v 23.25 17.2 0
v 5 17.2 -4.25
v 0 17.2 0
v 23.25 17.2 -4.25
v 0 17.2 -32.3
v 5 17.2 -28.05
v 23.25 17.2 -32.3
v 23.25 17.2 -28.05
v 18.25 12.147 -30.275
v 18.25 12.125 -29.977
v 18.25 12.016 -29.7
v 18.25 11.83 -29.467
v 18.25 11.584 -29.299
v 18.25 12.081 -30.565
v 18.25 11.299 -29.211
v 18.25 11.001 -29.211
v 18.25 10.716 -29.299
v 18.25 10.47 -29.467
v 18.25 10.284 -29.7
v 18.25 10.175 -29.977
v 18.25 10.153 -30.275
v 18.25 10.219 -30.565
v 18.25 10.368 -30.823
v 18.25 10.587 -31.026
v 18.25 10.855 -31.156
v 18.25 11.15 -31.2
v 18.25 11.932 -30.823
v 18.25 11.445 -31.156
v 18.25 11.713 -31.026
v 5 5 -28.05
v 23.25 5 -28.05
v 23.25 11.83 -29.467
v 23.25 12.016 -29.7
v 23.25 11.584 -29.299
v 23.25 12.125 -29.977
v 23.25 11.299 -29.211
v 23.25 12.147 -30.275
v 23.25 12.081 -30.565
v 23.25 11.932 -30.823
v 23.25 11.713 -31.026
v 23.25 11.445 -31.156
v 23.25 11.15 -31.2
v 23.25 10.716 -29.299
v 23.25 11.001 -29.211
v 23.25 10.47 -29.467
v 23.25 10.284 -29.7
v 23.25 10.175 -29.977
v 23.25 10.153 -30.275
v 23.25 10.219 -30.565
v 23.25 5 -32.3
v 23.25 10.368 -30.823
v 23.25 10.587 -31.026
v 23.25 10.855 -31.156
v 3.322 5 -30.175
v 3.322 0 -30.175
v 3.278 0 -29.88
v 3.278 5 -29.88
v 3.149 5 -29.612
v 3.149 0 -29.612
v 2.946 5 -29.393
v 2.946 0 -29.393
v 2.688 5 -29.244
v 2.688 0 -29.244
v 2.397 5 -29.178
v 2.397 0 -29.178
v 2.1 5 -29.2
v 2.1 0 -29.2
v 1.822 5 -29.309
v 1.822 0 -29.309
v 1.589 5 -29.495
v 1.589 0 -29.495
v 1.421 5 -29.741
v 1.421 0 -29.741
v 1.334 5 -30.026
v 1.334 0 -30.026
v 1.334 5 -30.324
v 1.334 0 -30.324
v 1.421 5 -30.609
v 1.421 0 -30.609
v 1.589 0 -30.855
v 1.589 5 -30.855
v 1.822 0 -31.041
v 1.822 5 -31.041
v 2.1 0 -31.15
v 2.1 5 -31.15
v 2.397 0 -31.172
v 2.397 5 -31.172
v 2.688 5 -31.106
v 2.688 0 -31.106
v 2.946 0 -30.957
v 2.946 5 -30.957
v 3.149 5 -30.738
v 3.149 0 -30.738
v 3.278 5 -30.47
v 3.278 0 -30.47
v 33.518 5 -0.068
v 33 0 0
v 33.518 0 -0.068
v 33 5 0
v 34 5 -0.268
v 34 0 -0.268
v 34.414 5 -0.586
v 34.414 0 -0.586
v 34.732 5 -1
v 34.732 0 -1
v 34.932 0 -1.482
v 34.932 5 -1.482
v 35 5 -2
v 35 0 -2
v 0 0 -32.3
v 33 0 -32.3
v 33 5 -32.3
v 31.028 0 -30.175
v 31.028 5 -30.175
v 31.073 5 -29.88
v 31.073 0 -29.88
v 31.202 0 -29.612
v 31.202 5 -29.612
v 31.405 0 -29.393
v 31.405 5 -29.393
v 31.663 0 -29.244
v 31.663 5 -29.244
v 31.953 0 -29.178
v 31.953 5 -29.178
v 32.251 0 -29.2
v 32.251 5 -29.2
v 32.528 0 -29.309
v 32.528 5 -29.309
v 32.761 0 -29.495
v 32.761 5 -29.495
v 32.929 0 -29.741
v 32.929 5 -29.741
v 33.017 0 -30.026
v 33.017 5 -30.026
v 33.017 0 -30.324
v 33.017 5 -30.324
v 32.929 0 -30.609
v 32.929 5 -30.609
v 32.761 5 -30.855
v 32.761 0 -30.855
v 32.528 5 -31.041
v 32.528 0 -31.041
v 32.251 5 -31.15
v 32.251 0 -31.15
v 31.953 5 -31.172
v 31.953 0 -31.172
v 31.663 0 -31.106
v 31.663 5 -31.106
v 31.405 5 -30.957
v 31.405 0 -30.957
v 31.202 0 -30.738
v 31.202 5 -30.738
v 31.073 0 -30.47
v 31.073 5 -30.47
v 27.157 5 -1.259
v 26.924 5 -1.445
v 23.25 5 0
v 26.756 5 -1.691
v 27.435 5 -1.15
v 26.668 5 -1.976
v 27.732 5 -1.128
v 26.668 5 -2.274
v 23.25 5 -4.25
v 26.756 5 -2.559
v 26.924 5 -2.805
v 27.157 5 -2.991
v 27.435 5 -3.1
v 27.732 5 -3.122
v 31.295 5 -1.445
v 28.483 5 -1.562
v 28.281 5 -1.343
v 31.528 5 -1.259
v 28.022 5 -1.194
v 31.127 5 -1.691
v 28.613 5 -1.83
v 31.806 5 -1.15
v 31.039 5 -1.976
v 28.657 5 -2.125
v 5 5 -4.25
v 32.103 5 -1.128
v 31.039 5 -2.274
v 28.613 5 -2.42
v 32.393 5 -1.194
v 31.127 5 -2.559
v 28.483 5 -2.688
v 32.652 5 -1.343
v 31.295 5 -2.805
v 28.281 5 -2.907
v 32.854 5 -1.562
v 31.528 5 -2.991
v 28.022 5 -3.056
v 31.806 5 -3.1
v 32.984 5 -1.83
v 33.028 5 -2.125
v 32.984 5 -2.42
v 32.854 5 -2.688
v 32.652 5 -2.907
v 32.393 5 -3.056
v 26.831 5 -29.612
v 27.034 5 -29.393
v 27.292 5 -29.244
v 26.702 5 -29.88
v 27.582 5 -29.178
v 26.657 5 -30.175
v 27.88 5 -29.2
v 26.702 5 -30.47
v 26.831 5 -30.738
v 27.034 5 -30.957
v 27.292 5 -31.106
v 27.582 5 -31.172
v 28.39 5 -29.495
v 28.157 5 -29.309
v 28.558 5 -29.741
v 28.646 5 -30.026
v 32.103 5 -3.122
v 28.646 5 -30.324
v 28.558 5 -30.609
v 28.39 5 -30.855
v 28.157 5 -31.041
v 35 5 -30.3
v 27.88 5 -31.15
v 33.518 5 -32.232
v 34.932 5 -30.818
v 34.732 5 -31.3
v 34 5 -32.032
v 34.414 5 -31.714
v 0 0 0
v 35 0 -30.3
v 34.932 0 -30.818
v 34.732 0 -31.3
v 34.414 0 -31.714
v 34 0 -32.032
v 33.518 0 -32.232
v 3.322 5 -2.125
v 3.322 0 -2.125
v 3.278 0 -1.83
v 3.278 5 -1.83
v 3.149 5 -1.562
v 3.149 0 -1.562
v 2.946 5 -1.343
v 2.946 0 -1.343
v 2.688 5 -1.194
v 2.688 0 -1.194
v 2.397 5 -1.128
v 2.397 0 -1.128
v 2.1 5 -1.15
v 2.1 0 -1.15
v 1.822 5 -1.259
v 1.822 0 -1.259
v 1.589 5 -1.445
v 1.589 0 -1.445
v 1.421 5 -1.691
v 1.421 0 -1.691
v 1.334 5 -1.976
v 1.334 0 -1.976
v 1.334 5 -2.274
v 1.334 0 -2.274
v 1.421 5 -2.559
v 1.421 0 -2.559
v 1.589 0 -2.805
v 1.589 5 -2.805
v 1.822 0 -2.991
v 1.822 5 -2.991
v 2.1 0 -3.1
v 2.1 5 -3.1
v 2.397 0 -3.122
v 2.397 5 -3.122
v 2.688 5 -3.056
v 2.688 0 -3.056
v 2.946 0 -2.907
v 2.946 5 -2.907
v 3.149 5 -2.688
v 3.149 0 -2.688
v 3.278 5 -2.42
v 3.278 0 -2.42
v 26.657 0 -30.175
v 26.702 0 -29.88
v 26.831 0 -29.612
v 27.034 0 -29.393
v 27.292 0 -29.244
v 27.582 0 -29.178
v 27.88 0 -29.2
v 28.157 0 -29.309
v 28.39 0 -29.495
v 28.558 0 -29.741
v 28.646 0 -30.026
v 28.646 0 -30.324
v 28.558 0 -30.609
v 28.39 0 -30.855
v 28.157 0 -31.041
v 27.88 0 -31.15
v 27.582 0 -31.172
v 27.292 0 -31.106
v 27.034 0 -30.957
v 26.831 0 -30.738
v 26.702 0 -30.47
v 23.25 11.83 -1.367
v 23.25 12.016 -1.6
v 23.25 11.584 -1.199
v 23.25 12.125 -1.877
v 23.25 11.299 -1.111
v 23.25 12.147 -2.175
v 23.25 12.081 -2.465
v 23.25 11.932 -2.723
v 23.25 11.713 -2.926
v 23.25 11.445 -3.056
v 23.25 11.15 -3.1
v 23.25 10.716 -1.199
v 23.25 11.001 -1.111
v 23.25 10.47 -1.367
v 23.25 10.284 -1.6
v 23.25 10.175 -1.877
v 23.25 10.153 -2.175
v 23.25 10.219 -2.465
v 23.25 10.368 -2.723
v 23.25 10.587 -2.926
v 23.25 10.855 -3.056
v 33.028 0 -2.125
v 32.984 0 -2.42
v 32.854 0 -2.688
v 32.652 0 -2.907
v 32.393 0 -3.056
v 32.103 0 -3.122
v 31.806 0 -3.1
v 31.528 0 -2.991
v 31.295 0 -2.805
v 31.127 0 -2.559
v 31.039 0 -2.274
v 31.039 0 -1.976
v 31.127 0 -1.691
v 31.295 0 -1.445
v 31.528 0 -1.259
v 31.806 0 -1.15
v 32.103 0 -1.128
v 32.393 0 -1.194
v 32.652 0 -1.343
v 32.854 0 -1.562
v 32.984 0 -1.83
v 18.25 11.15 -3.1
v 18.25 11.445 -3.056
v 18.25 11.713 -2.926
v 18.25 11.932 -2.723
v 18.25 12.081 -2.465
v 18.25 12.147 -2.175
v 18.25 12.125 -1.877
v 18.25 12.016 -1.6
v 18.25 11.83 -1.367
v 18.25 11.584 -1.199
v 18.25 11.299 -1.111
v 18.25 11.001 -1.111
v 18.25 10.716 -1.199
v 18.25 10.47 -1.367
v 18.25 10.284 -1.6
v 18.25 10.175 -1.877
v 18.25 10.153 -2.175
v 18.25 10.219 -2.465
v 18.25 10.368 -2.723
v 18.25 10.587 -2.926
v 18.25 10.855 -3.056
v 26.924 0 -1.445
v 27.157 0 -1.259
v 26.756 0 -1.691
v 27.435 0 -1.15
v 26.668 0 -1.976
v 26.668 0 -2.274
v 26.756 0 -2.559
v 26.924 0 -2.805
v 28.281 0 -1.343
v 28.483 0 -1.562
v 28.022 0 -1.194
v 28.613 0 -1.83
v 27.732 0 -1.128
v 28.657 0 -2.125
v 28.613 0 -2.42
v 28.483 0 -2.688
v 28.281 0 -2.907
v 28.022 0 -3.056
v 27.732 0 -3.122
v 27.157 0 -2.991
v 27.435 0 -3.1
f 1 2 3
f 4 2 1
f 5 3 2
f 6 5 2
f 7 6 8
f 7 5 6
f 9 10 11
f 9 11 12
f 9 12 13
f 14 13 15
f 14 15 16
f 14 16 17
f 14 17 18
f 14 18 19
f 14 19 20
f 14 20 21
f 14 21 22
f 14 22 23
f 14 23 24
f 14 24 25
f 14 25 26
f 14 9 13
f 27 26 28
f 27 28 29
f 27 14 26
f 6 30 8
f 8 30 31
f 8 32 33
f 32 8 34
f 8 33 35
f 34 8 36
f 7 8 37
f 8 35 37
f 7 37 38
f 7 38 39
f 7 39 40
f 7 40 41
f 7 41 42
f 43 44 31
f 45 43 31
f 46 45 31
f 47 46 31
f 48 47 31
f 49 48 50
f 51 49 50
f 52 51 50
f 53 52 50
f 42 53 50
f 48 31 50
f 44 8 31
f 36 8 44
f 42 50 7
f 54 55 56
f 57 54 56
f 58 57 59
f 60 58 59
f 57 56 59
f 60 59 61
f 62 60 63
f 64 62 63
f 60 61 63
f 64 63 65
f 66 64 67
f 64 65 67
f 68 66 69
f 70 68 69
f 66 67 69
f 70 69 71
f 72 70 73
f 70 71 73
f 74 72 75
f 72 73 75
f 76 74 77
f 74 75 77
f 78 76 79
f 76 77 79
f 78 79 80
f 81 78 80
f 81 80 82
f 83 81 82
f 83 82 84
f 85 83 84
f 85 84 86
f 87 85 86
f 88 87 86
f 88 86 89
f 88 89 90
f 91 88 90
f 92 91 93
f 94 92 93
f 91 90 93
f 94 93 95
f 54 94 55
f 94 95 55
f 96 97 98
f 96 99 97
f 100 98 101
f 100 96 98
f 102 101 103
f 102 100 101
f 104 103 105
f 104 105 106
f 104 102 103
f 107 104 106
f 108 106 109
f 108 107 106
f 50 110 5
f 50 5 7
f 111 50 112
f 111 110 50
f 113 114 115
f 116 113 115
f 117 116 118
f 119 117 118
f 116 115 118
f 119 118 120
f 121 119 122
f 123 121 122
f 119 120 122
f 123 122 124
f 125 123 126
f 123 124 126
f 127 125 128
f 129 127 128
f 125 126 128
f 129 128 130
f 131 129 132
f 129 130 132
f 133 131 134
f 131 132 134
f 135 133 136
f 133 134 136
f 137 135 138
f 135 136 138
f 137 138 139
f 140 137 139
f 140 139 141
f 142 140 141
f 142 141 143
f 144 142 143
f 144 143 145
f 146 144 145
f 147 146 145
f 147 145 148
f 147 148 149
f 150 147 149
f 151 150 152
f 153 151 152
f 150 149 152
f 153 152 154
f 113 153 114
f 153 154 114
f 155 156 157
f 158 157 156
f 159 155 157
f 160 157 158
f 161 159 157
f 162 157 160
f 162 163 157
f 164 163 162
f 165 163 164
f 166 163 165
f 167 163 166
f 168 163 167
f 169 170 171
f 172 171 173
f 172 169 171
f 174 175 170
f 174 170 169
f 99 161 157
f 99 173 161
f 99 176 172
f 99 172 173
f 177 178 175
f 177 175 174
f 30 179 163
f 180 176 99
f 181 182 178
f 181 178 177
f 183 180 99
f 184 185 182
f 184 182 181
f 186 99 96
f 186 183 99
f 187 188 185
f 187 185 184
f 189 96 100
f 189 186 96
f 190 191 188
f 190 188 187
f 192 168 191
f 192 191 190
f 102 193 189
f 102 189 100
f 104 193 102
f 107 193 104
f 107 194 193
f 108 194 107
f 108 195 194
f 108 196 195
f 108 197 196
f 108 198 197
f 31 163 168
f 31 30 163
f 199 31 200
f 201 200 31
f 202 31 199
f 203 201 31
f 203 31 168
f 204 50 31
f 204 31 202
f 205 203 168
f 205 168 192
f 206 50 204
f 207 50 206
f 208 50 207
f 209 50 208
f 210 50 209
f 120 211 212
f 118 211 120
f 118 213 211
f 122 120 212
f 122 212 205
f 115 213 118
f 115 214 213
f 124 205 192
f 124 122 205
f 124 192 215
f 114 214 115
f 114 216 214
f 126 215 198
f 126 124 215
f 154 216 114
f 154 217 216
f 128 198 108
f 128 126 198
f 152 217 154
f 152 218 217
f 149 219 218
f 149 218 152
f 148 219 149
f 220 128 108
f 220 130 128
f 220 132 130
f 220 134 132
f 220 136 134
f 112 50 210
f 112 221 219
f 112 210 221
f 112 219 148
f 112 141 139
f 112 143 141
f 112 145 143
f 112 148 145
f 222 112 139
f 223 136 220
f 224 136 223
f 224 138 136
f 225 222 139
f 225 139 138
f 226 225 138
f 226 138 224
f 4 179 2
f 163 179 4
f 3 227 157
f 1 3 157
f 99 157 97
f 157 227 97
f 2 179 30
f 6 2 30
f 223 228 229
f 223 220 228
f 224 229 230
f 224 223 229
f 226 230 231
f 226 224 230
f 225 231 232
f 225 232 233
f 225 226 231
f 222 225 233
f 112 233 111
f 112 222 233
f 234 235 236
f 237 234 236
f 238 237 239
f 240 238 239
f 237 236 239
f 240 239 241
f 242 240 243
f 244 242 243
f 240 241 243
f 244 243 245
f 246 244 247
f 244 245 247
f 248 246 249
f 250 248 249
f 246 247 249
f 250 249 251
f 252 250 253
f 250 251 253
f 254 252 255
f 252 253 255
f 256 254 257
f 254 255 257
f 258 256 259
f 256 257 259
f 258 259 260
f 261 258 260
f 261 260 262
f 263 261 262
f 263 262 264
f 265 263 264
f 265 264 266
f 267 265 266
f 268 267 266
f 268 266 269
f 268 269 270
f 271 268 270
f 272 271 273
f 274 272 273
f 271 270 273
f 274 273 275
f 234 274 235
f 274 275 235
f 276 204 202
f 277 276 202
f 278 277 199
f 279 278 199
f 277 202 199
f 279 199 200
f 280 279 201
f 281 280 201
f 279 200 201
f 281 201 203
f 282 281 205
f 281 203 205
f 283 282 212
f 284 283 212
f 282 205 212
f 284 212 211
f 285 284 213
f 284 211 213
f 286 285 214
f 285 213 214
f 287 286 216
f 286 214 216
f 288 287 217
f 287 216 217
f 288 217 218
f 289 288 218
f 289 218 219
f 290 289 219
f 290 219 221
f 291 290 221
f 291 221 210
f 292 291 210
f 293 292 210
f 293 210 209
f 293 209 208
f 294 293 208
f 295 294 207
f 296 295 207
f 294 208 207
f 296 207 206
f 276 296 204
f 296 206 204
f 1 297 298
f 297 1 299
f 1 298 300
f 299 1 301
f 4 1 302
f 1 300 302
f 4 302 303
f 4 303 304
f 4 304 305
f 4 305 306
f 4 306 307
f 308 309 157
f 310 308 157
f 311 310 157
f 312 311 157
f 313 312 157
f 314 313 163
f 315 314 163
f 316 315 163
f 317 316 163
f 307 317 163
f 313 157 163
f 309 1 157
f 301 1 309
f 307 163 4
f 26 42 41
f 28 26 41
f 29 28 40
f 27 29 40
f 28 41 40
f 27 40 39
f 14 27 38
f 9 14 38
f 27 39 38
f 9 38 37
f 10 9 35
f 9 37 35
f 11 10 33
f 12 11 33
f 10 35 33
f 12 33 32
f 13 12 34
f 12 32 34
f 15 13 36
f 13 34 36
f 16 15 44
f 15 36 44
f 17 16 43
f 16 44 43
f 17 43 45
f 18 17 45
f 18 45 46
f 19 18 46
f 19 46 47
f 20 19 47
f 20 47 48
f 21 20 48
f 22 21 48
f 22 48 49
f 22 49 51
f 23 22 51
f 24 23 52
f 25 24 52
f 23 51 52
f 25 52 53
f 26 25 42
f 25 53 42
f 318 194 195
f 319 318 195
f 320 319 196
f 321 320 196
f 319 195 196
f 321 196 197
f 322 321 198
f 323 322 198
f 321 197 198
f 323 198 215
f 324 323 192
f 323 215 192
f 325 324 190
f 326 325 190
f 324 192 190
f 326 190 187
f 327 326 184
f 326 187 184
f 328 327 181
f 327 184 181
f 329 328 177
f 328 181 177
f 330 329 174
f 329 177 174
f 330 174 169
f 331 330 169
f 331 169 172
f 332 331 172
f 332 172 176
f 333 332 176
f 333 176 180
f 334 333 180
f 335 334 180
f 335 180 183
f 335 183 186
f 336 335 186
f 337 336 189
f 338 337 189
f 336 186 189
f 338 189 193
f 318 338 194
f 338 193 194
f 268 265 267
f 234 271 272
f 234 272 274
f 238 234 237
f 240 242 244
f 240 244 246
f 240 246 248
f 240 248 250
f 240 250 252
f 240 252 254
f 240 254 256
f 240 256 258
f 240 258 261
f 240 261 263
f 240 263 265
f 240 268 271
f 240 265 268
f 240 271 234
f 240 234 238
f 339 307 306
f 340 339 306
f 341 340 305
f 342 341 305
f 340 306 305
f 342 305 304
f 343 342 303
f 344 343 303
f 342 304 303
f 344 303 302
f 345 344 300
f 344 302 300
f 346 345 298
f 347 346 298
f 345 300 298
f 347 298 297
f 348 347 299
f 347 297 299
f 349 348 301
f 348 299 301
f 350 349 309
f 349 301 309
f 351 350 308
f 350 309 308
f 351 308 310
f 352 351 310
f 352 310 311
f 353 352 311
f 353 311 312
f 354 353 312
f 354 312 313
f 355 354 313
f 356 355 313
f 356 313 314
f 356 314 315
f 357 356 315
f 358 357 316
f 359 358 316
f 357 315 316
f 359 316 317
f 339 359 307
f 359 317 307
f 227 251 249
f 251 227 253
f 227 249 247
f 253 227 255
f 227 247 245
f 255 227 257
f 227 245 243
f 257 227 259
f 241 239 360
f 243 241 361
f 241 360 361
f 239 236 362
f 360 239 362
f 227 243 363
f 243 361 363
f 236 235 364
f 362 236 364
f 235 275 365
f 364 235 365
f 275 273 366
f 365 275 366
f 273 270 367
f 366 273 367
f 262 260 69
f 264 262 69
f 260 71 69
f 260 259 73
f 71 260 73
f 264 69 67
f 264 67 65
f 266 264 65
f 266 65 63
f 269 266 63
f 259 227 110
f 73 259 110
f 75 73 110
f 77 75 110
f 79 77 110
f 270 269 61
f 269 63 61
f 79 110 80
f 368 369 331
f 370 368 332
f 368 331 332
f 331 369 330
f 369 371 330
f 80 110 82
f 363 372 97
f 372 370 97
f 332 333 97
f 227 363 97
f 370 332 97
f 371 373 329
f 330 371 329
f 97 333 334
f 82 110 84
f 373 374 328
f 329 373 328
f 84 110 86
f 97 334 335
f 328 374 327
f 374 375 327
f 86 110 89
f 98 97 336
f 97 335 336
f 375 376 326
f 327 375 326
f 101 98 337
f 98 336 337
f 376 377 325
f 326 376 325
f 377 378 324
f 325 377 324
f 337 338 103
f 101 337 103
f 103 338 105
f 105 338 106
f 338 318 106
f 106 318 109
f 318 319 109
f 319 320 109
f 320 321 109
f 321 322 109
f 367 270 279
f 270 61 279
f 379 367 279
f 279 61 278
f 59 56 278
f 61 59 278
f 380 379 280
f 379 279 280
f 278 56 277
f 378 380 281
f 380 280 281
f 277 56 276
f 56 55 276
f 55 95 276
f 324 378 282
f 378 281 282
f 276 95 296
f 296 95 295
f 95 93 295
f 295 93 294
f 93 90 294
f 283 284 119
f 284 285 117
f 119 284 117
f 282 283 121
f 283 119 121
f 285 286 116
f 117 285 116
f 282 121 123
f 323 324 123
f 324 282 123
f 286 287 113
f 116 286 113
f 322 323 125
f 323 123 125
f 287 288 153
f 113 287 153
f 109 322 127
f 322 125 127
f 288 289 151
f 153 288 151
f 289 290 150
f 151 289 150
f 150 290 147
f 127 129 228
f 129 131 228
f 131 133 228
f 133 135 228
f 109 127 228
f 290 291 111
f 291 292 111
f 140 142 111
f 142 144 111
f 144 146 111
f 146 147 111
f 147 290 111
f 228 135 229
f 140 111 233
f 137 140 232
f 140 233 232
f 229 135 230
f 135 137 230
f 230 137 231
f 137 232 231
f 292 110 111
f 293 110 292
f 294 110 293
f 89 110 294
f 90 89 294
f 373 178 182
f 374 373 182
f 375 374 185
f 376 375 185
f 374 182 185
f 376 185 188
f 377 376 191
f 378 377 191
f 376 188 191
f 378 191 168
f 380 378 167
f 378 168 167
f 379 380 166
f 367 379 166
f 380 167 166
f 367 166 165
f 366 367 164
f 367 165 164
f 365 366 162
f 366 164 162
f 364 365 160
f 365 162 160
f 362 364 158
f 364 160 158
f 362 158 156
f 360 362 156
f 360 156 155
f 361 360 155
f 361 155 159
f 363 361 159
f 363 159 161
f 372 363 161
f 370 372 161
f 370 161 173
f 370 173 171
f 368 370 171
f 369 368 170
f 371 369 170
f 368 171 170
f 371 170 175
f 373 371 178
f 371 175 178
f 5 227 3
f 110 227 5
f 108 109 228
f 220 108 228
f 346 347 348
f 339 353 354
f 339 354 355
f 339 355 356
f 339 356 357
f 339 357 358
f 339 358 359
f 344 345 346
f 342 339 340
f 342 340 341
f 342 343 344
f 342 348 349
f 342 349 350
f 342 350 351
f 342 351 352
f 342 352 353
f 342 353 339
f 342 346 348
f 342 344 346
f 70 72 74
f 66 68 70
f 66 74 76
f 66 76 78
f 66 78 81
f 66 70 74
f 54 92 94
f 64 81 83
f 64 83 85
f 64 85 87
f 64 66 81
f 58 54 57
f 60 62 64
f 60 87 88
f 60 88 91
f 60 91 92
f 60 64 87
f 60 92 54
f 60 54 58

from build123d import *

# Parameters (mm, degrees)
SKETCH4_W           = 35
SKETCH4_H           = 32.3
BOSS_EXTRUDE3_DEPTH = 5
SKETCH6_W           = 5
SKETCH6_H           = 32.3
BOSS_EXTRUDE5_DEPTH = 12.2
SKETCH8_W           = 18.25
SKETCH8_H           = 4.25
BOSS_EXTRUDE6_DEPTH = 12.2
SKETCH10_R          = 1
CUT_EXTRUDE1_DEPTH  = 5
SKETCH11_R          = 1
CUT_EXTRUDE2_DEPTH  = 5
SKETCH12_R          = 1
CUT_EXTRUDE3_DEPTH  = 5
FILLET2_R           = 2


with BuildPart() as part:
    # Sketch4 → Boss-Extrude3 (new body)
    with BuildSketch(Plane(origin=(0, 0, 0), x_dir=(1, 0, 0), z_dir=(0, 1, 0))):
        with Locations((17.5, 16.15)):
            Rectangle(SKETCH4_W, SKETCH4_H)
    extrude(amount=BOSS_EXTRUDE3_DEPTH)

    # Sketch6 → Boss-Extrude5 (add)
    with BuildSketch(Plane(origin=(0, 5, 0), x_dir=(1, 0, 0), z_dir=(0, 1, 0))):
        with Locations((2.5, 16.15)):
            Rectangle(SKETCH6_W, SKETCH6_H)
    extrude(amount=BOSS_EXTRUDE5_DEPTH)

    # Sketch8 → Boss-Extrude6 (add)
    with BuildSketch(Plane(origin=(0, 5, 0), x_dir=(1, 0, 0), z_dir=(0, 1, 0))):
        with Locations((14.125, 2.125)):
            Rectangle(SKETCH8_W, SKETCH8_H)
        with Locations((14.125, 30.175)):
            Rectangle(SKETCH8_W, SKETCH8_H)
    extrude(amount=BOSS_EXTRUDE6_DEPTH)

    # Sketch10 → Cut-Extrude1 (cut)
    with BuildSketch(Plane(origin=(23.25, 0, 0), x_dir=(0, 0, -1), z_dir=(1, 0, 0))):
        with Locations((2.1, 11.15)):
            Circle(SKETCH10_R)
        with Locations((30.2, 11.15)):
            Circle(SKETCH10_R)
    extrude(amount=-CUT_EXTRUDE1_DEPTH, mode=Mode.SUBTRACT)

    # Sketch11 → Cut-Extrude2 (cut)
    with BuildSketch(Plane(origin=(0, 5, 0), x_dir=(1, 0, 0), z_dir=(0, 1, 0))):
        with BuildLine():
            ThreePointArc((28.65708215, 30.175), (27.65708215, 31.175), (26.65708215, 30.175))
            Line((26.65708215, 30.175), (28.65708215, 30.175))
        make_face()
        with BuildLine():
            Line((28.65708215, 30.175), (26.65708215, 30.175))
            ThreePointArc((26.65708215, 30.175), (27.65708215, 29.175), (28.65708215, 30.175))
        make_face()
        with BuildLine():
            ThreePointArc((33.028108072, 30.175), (32.028108072, 31.175), (31.028108072, 30.175))
            Line((31.028108072, 30.175), (33.028108072, 30.175))
        make_face()
        with BuildLine():
            Line((33.028108072, 30.175), (31.028108072, 30.175))
            ThreePointArc((31.028108072, 30.175), (32.028108072, 29.175), (33.028108072, 30.175))
        make_face()
        with Locations((27.65708215, 2.125)):
            Circle(SKETCH11_R)
        with Locations((32.028108072, 2.125)):
            Circle(SKETCH11_R)
    extrude(amount=-CUT_EXTRUDE2_DEPTH, mode=Mode.SUBTRACT)

    # Sketch12 → Cut-Extrude3 (cut)
    with BuildSketch(Plane.XZ):
        with Locations((2.322349093, -2.125)):
            Circle(SKETCH12_R)
        with Locations((2.322349093, -30.175)):
            Circle(SKETCH12_R)
    extrude(amount=-CUT_EXTRUDE3_DEPTH, mode=Mode.SUBTRACT)

    # Fillet2
    fillet2_edges = [part.edges().sort_by_distance(p)[0] for p in [
        (35, 2.5, -32.3),
        (35, 2.5, 0),
    ]]
    fillet(fillet2_edges, radius=FILLET2_R)


solid = part.part
